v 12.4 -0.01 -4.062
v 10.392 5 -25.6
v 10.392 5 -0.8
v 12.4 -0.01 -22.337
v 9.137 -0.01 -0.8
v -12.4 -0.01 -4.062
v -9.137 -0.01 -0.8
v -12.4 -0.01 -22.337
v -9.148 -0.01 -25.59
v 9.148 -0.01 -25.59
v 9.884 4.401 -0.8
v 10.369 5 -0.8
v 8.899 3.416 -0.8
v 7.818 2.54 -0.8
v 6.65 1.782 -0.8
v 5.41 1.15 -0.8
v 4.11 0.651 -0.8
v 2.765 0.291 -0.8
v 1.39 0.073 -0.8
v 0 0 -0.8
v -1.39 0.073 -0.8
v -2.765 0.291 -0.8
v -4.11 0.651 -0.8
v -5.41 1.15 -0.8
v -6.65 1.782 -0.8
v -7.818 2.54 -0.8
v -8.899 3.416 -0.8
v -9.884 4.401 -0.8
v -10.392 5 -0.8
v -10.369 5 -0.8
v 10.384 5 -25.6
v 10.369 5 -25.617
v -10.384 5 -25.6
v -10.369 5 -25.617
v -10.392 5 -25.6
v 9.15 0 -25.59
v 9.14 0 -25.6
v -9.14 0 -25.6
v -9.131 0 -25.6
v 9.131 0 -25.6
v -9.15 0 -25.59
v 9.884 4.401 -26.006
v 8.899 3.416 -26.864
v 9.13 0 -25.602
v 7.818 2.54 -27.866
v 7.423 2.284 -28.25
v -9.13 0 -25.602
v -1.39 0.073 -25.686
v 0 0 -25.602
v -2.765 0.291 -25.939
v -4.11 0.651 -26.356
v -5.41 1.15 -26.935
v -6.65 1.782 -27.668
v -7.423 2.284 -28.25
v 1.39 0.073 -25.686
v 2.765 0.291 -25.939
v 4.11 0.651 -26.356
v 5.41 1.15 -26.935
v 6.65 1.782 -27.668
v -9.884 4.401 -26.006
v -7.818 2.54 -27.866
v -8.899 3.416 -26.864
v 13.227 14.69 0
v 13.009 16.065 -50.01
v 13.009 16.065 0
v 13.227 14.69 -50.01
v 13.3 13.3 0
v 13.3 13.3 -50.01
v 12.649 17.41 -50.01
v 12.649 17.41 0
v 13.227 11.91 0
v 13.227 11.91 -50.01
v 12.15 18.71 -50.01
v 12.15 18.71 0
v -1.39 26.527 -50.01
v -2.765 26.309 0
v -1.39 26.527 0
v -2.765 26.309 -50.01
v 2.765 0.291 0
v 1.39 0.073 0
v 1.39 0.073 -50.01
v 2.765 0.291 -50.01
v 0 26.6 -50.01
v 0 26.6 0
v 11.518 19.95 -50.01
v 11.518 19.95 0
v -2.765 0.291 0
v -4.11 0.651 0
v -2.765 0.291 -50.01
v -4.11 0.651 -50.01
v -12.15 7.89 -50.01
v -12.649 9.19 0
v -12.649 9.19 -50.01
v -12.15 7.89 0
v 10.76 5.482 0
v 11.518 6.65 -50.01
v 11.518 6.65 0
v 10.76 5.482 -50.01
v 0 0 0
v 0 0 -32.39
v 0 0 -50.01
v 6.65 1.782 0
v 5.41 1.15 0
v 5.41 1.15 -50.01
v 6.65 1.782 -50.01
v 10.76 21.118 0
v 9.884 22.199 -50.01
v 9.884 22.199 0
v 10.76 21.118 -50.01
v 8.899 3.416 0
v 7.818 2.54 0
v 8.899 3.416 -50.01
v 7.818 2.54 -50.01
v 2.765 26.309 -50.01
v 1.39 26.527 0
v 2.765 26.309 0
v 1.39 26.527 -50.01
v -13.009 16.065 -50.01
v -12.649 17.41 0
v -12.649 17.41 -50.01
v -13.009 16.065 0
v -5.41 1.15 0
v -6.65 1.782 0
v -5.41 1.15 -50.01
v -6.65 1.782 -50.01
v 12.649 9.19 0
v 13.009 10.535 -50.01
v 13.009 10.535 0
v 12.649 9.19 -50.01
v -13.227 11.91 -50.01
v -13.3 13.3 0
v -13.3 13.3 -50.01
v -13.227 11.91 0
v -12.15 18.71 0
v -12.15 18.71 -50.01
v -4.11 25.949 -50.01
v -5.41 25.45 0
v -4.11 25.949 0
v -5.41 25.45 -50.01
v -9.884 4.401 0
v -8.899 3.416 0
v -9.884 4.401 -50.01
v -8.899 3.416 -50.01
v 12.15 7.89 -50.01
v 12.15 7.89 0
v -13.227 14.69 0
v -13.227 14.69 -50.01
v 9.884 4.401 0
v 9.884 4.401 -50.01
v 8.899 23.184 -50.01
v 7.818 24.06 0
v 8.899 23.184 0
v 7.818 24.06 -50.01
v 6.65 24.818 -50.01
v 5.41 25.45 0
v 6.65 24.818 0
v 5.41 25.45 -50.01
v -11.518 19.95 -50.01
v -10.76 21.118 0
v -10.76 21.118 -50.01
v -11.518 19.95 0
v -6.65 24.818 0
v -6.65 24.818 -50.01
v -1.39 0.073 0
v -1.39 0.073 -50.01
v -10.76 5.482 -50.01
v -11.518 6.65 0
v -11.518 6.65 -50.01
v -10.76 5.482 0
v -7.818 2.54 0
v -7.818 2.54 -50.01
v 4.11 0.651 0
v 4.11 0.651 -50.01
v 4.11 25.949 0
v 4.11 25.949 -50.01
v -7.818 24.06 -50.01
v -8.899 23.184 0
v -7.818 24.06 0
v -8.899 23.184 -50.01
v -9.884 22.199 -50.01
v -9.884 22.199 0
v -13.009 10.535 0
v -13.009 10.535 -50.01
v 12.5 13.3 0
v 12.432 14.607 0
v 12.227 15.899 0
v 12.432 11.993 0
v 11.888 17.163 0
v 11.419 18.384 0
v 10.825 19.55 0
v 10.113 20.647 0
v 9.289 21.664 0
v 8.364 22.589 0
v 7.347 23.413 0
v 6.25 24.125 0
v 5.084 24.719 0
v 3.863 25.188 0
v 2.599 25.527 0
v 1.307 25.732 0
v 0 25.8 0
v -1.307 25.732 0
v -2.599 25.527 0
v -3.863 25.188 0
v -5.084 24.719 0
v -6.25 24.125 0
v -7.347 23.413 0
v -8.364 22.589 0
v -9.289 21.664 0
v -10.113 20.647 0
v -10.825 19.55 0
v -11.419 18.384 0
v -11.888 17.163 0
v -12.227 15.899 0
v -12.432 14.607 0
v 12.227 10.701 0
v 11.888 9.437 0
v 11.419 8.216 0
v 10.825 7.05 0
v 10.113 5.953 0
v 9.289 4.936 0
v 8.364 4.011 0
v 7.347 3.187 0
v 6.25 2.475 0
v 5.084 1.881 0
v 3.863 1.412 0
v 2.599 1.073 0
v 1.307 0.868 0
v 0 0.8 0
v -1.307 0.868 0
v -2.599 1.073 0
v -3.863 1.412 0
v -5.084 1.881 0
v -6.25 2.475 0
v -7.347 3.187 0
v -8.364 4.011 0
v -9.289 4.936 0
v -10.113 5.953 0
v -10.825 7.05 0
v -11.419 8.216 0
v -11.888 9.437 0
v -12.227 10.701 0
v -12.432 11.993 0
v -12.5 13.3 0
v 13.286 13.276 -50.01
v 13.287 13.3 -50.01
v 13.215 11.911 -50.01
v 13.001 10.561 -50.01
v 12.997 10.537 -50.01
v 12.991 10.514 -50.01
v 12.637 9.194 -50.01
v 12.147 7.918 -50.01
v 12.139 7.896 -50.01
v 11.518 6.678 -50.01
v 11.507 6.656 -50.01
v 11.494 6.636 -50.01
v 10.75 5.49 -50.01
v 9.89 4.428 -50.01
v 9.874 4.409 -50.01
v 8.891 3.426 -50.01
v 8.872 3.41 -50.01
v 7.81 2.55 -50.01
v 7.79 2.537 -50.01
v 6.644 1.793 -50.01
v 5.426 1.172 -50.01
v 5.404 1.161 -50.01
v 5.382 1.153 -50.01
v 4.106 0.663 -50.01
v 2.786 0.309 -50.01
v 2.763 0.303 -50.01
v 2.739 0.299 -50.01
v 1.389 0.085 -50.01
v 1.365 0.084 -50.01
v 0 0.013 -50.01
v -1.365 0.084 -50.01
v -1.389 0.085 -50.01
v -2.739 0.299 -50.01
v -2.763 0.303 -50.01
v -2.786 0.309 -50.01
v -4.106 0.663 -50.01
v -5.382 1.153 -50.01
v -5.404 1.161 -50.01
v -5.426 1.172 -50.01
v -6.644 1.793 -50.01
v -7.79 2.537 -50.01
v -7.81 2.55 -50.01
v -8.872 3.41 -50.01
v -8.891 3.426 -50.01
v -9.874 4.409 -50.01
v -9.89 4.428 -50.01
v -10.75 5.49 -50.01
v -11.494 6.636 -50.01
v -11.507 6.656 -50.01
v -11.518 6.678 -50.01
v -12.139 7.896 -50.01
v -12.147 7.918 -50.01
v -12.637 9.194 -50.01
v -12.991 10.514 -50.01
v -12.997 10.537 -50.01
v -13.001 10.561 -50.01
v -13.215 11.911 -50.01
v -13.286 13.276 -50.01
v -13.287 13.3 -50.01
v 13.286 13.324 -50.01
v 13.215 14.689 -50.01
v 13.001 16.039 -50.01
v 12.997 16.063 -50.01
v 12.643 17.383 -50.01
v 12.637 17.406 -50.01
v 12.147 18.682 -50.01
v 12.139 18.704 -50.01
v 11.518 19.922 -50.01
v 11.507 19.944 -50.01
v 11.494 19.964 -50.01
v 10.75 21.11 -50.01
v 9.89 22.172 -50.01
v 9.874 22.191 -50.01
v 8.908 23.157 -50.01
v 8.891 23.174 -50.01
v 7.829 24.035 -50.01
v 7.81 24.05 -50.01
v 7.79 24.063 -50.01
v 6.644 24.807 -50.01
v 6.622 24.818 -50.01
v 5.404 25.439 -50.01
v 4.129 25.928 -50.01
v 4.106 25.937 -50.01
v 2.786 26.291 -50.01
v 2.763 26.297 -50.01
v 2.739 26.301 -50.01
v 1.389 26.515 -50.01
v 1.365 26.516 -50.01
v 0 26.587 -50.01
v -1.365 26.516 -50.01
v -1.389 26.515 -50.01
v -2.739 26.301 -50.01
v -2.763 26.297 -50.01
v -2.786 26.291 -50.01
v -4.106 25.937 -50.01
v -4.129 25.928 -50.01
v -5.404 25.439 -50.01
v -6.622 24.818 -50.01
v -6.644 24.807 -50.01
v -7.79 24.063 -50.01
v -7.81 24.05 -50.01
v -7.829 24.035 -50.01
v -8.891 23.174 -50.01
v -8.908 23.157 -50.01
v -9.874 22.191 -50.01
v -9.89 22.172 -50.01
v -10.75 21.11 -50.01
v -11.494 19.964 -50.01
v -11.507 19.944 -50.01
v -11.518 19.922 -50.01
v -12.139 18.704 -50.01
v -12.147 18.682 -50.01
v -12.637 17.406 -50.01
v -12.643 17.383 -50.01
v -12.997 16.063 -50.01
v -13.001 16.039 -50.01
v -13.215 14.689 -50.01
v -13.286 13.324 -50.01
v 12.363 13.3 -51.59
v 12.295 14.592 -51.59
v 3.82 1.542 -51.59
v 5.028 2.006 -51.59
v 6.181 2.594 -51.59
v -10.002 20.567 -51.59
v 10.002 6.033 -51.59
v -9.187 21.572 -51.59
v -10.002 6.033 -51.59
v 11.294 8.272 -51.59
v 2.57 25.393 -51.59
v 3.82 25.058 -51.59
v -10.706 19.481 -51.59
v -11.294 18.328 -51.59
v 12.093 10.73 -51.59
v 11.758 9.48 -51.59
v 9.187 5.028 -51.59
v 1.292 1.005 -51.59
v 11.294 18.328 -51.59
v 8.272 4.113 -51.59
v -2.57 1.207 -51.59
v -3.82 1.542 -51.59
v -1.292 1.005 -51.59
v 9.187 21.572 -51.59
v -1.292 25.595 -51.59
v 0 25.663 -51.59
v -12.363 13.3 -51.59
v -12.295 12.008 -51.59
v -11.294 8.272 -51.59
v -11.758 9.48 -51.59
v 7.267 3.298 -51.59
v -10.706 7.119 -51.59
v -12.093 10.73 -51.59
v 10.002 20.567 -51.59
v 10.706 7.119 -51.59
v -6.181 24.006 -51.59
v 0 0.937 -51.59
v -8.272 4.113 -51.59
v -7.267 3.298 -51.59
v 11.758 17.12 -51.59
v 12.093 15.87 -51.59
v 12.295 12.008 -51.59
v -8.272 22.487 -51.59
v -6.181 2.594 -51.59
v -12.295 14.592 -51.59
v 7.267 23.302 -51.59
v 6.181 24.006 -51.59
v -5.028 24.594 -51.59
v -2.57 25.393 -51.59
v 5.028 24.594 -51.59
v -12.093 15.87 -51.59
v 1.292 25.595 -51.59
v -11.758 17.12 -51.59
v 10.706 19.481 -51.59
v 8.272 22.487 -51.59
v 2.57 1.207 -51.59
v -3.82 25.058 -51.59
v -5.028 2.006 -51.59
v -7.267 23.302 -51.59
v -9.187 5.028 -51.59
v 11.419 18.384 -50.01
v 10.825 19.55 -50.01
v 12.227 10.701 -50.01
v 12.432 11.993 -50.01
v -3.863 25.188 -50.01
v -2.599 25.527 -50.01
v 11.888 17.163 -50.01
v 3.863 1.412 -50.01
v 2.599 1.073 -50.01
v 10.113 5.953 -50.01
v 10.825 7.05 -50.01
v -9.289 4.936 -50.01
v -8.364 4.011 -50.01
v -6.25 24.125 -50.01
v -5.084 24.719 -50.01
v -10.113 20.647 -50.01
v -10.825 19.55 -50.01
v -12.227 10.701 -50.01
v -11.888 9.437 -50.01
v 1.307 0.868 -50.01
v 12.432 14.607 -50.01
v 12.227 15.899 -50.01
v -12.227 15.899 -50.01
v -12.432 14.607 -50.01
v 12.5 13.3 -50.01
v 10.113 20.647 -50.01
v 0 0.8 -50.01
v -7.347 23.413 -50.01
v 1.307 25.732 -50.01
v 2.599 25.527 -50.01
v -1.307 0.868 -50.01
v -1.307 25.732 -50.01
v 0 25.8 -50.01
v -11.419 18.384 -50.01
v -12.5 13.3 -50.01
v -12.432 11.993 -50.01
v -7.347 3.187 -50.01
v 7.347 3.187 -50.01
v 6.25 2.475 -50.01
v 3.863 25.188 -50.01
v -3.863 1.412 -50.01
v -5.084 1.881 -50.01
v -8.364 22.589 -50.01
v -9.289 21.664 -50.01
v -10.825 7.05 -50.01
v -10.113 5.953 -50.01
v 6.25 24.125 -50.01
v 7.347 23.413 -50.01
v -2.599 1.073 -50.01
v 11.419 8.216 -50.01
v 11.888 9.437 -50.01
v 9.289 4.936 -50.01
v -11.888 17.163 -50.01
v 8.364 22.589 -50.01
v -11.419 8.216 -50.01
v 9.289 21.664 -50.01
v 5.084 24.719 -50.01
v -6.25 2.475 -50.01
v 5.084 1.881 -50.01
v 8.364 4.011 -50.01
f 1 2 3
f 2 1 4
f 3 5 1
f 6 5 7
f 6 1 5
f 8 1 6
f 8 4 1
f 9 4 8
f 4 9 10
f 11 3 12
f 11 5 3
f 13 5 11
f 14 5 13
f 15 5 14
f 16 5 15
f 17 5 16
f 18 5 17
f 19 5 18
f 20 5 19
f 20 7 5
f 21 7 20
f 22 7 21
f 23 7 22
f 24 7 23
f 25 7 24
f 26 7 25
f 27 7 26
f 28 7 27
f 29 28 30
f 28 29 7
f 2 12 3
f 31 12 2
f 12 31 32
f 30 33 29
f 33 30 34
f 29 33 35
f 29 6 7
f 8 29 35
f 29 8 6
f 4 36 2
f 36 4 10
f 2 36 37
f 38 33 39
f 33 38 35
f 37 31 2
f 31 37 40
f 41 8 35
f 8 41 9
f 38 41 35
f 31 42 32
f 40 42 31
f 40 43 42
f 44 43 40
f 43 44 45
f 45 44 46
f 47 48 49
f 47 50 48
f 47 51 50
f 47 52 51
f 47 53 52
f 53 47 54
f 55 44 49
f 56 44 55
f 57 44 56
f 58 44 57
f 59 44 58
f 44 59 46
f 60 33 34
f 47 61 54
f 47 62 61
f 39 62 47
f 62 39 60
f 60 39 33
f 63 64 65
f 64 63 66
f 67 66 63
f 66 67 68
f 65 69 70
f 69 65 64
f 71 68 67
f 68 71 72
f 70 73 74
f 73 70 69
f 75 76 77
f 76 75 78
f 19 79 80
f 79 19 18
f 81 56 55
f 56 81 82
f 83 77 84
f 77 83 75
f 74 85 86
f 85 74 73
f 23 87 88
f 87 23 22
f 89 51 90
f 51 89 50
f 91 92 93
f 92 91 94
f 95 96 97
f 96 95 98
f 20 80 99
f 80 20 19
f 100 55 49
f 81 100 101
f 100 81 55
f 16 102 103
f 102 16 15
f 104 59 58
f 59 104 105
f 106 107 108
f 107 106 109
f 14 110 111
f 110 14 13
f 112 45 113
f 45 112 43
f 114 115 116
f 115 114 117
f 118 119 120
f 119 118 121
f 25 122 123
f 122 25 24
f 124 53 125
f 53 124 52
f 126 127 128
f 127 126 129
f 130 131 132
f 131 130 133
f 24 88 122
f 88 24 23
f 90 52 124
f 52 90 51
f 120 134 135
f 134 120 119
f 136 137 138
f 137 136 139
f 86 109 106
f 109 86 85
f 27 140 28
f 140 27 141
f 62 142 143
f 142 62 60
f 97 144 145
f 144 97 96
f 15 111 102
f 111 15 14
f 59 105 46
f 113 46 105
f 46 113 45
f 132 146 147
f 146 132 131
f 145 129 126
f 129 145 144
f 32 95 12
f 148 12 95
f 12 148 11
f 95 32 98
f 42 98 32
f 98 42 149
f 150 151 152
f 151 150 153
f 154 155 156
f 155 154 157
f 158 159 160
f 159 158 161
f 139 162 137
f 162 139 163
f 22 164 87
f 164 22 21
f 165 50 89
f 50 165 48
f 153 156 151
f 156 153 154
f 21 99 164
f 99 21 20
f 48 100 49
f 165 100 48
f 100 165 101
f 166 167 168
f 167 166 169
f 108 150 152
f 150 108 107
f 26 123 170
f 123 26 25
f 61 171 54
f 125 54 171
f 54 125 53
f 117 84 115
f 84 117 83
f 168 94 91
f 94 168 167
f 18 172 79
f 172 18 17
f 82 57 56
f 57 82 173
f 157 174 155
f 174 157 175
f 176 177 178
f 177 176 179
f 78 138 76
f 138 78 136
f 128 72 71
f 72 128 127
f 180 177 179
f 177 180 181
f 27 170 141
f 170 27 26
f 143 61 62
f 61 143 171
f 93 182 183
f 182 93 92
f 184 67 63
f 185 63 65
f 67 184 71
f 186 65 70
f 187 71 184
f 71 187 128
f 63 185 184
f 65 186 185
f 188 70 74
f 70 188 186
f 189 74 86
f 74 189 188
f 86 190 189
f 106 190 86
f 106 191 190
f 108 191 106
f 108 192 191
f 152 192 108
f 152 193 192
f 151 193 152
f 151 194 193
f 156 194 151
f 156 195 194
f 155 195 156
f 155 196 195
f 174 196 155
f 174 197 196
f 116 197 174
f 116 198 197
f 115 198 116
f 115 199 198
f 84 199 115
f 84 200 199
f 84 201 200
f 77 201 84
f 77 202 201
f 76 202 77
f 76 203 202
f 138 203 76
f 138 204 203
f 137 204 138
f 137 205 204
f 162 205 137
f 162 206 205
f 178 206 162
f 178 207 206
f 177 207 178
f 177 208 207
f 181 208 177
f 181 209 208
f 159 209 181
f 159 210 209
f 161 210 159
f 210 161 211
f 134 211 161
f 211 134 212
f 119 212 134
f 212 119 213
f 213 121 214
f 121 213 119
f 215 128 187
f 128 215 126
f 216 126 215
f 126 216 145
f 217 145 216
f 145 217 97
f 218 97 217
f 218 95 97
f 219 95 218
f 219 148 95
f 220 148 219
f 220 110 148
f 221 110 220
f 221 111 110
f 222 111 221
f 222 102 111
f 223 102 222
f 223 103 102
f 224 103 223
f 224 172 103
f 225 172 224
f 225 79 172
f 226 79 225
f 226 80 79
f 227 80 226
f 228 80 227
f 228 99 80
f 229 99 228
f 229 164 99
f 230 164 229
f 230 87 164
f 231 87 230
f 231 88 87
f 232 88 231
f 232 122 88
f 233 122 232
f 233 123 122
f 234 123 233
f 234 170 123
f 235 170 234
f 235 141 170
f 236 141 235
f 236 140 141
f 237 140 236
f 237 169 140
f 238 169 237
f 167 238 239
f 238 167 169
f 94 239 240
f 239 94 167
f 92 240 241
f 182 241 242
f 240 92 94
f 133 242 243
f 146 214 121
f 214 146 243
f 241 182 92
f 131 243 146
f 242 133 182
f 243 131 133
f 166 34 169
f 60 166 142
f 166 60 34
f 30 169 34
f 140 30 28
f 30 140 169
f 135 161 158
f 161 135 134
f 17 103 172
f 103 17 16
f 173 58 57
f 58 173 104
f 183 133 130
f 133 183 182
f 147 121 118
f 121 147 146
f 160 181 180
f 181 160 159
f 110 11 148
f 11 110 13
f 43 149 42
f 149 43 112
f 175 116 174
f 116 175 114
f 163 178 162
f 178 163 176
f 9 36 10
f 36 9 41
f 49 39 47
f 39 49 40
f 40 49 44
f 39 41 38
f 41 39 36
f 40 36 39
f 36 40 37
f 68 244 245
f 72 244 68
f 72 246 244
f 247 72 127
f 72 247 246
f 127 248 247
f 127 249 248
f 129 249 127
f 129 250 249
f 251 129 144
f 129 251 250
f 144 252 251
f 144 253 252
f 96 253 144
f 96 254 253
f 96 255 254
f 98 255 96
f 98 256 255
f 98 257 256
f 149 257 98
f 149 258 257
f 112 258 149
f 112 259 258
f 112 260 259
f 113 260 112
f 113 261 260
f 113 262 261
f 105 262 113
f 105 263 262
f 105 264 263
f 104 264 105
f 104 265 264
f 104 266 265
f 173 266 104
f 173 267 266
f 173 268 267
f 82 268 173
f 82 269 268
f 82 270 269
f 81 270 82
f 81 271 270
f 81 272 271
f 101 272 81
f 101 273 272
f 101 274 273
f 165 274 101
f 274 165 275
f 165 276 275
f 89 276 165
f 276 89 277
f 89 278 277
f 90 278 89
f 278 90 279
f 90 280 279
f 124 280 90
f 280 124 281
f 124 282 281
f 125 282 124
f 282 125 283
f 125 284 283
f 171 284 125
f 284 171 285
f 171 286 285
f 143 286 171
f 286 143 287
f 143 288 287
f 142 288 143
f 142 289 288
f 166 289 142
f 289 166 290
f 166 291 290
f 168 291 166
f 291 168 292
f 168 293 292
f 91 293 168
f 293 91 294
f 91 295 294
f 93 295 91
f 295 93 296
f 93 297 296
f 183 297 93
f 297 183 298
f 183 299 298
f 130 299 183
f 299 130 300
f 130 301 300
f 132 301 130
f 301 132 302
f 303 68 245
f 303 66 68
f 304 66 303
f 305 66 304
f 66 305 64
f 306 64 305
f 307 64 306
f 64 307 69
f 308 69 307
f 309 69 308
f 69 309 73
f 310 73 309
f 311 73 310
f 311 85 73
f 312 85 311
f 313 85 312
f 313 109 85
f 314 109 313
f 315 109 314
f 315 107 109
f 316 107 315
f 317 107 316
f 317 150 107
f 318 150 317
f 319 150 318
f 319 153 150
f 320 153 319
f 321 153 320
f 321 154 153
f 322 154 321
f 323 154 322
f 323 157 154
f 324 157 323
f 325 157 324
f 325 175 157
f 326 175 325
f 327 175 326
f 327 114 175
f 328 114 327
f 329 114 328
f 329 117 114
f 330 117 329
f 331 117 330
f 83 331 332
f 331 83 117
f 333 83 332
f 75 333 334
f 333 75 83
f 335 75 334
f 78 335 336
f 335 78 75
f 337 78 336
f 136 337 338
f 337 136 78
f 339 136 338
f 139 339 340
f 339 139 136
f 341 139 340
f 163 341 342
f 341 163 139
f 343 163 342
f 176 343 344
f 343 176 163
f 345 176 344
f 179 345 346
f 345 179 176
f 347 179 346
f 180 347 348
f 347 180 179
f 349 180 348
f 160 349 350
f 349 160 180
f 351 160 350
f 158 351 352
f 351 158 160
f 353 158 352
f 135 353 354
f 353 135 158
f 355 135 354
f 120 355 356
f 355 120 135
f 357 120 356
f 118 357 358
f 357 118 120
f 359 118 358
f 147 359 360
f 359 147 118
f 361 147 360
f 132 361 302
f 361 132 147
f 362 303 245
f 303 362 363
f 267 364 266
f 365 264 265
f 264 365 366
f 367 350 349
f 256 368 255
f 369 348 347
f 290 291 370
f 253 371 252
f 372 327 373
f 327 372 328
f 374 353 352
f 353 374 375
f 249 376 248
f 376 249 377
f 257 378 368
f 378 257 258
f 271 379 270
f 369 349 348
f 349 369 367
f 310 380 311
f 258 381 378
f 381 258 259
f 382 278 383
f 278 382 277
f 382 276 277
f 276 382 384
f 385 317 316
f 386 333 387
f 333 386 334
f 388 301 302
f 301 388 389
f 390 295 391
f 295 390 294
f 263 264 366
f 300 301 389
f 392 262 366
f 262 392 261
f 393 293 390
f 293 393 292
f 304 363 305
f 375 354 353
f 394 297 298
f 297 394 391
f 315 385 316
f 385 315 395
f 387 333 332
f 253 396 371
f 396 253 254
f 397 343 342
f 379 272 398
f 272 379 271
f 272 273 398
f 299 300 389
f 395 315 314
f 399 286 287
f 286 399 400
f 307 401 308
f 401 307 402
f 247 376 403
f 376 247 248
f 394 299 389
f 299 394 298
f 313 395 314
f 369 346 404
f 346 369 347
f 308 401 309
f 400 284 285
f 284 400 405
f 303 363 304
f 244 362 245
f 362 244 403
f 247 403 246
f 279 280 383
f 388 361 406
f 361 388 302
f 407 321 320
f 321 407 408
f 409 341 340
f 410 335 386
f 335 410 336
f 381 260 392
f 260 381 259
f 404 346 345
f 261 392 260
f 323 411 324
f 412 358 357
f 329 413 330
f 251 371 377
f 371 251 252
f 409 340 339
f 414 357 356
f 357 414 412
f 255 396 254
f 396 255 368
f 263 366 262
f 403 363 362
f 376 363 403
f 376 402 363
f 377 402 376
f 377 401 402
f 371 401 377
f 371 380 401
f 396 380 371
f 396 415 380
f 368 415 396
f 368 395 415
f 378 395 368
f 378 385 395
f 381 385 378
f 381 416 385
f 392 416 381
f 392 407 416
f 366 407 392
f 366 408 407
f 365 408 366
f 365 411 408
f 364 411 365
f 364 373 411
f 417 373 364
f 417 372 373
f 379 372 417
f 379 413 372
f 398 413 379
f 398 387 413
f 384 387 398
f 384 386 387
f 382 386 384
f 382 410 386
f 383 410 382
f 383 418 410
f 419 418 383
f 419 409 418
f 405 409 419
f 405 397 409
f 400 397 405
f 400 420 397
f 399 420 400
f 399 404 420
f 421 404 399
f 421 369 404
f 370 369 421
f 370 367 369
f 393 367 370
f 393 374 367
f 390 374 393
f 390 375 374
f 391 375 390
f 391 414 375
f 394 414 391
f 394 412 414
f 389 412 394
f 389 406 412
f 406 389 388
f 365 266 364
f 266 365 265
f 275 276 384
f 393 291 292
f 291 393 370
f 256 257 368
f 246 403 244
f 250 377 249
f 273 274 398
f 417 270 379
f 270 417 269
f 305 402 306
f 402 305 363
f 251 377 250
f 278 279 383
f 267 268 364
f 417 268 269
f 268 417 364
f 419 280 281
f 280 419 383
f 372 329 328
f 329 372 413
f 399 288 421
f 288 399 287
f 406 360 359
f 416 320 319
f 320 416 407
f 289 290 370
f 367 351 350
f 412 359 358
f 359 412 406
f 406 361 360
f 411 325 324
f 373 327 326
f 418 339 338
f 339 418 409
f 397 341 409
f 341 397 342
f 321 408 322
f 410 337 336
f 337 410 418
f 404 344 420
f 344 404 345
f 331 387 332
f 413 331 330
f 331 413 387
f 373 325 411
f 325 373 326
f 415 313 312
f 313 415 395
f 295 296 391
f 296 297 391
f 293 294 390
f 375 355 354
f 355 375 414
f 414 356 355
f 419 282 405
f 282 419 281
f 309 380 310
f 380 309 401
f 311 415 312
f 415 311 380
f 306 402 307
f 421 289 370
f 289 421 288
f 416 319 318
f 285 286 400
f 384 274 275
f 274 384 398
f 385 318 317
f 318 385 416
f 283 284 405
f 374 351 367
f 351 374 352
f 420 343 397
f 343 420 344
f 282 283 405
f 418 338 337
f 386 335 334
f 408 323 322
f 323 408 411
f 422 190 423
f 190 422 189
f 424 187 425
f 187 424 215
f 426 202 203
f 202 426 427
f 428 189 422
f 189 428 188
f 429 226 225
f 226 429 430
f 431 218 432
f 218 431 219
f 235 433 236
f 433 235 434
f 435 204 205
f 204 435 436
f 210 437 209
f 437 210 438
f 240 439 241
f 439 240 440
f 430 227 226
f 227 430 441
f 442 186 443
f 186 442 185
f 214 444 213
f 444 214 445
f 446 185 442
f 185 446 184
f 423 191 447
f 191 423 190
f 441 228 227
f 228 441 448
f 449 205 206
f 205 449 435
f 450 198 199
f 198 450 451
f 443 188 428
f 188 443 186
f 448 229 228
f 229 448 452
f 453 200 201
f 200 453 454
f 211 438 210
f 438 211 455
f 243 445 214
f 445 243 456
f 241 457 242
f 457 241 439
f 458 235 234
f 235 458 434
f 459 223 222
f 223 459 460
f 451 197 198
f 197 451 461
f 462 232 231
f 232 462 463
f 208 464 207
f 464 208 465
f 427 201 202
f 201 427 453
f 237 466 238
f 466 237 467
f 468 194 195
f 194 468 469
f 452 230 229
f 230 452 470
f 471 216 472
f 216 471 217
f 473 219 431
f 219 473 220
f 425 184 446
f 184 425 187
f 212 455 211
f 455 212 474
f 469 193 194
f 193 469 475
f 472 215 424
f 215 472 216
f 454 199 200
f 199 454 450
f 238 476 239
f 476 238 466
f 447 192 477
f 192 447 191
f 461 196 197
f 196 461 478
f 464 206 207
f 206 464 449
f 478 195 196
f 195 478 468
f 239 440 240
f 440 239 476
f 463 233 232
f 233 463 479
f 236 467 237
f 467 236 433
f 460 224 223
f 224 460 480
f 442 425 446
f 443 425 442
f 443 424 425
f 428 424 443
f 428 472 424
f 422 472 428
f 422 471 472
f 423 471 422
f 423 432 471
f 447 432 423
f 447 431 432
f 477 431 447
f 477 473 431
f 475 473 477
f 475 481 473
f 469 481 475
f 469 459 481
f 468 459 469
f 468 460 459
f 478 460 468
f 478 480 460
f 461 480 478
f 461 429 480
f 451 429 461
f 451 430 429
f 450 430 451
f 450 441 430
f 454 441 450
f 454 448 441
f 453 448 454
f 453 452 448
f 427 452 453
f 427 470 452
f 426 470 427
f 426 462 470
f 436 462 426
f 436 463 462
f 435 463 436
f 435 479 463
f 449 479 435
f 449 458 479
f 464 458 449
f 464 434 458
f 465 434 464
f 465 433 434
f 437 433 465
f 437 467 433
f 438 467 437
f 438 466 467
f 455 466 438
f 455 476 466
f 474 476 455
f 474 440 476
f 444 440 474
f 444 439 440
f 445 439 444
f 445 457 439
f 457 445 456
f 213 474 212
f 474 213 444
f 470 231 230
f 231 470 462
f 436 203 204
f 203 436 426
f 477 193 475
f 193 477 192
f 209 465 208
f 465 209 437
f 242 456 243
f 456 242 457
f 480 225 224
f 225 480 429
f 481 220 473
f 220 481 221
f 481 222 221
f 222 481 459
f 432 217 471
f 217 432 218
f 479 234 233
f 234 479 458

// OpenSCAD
$fs = 1;
$fa = 6;

eps = 0.01;

hObj = 50;
dObj = 25;
wallThickness = 1.6;
bottom = true;

hCyl = bottom ? hObj + wallThickness : hObj;
dCyl = dObj + wallThickness;
rCyl = dCyl / 2;
chamferY = dObj >= 5 ? 5 : dObj;
chamferX = sqrt(rCyl ^ 2 - (rCyl - chamferY) ^ 2);
bottomChamfer = sqrt(2 * (sqrt(2 * wallThickness ^ 2) - wallThickness) ^ 2);

module prism(w, d, h) {
  polyhedron(
    points=[
      [0,0,0],
      [0,d,h],
      [w,d,h],
      [w,0,0],
      [0,d,0],
      [w,d,0]
    ],
    faces=[
      [0,1,2,3],
      [2,1,4,5],
      [0,3,5,4],
      [0,4,1],
      [3,2,5]
    ]
  );
}

module chamfer() {
  chamferLPoints = [
    [0 - eps,  0 - eps,  -0.8       ],
    [9.1375,   0 - eps,  -0.8       ],
    [12.4,     0 - eps,  -4.0625    ],
    [chamferX, chamferY, -0.8       ],
    [0 - eps,  chamferY, -0.8       ],
    [12.4,     0 - eps,  -13.2 - eps],
    [chamferX, chamferY, -13.2 - eps],
    [0 - eps,  0 - eps,  -13.2 - eps],
    [0 - eps,  chamferY, -13.2 - eps]
  ];
  chamferLFaces = [
    [0,4,3,1],
    [1,3,2],
    [2,3,6,5],
    [7,5,6,8],
    [4,8,6,3],
    [0,7,8,4],
    [0,1,2,5,7]
  ];
  polyhedron(chamferLPoints, chamferLFaces);
}

module chamferFull() {
  chamferToTopPoints = [
    [0 - eps,     0 - eps,  -0.8 - eps],
    [9.1375,      0 - eps,  -0.8 - eps],
    [chamferX,    chamferY, -0.8 - eps],
    [0 - eps,     chamferY, -0.8 - eps],
    [chamferX - chamferY,    chamferY, chamferY         ],
    [0 - eps,     chamferY, chamferY         ] 
  ];
  chamferToTopFaces = [
    [0,1,2,3],
    [1,4,2],
    [3,5,0],
    [5,4,1,0],
    [4,5,3,2]
  ];

  union() {
    chamfer();
    mirror([1,0,0]) chamfer();
    mirror([0,0,1]) translate([0, 0, 13.2*2]) chamfer();
    mirror([1,0,0]) mirror([0,0,1]) translate([0, 0, 13.2*2]) chamfer();
    mirror([0,0,1]) translate([0, 0, 13.2*2]) polyhedron(chamferToTopPoints, chamferToTopFaces);
    mirror([1,0,0]) mirror([0,0,1]) translate([0, 0, 13.2*2]) polyhedron(chamferToTopPoints, chamferToTopFaces);
  }
}

difference() {
  union() {
    rotate([90, 0, 180]) translate([0, -13.2, -6.8]) import("opengrid-bare-directional-snap-v21.3mf");
    chamferFull();
    translate([0, dCyl / 2, -hCyl]) cylinder(hCyl, d = dCyl);
  }
  
  union() {
    translate([-14, -6.8 - eps, -25.6 + 6.8 - eps]) rotate([-90, 0, 0]) prism(28, 6.8 + eps, 6.8 + eps);
    translate([-14, -6.8 - eps, -25.6 - 6.8 + eps]) cube([28, 6.8 + eps, 6.8]);
  }

  translate([0, dCyl / 2, -hObj - eps]) cylinder(hObj + 2 * eps, d1=dObj, d2=dObj);
  
  if (bottom) {
    difference() {
      translate([0, dCyl / 2, -hCyl -eps]) cylinder(wallThickness, d = dCyl + eps * 2);
      translate([0, dCyl / 2, -hCyl + eps]) cylinder(wallThickness + eps, d1 = dCyl - 2 * bottomChamfer, d2 = dCyl + eps);
    }
  }
}
